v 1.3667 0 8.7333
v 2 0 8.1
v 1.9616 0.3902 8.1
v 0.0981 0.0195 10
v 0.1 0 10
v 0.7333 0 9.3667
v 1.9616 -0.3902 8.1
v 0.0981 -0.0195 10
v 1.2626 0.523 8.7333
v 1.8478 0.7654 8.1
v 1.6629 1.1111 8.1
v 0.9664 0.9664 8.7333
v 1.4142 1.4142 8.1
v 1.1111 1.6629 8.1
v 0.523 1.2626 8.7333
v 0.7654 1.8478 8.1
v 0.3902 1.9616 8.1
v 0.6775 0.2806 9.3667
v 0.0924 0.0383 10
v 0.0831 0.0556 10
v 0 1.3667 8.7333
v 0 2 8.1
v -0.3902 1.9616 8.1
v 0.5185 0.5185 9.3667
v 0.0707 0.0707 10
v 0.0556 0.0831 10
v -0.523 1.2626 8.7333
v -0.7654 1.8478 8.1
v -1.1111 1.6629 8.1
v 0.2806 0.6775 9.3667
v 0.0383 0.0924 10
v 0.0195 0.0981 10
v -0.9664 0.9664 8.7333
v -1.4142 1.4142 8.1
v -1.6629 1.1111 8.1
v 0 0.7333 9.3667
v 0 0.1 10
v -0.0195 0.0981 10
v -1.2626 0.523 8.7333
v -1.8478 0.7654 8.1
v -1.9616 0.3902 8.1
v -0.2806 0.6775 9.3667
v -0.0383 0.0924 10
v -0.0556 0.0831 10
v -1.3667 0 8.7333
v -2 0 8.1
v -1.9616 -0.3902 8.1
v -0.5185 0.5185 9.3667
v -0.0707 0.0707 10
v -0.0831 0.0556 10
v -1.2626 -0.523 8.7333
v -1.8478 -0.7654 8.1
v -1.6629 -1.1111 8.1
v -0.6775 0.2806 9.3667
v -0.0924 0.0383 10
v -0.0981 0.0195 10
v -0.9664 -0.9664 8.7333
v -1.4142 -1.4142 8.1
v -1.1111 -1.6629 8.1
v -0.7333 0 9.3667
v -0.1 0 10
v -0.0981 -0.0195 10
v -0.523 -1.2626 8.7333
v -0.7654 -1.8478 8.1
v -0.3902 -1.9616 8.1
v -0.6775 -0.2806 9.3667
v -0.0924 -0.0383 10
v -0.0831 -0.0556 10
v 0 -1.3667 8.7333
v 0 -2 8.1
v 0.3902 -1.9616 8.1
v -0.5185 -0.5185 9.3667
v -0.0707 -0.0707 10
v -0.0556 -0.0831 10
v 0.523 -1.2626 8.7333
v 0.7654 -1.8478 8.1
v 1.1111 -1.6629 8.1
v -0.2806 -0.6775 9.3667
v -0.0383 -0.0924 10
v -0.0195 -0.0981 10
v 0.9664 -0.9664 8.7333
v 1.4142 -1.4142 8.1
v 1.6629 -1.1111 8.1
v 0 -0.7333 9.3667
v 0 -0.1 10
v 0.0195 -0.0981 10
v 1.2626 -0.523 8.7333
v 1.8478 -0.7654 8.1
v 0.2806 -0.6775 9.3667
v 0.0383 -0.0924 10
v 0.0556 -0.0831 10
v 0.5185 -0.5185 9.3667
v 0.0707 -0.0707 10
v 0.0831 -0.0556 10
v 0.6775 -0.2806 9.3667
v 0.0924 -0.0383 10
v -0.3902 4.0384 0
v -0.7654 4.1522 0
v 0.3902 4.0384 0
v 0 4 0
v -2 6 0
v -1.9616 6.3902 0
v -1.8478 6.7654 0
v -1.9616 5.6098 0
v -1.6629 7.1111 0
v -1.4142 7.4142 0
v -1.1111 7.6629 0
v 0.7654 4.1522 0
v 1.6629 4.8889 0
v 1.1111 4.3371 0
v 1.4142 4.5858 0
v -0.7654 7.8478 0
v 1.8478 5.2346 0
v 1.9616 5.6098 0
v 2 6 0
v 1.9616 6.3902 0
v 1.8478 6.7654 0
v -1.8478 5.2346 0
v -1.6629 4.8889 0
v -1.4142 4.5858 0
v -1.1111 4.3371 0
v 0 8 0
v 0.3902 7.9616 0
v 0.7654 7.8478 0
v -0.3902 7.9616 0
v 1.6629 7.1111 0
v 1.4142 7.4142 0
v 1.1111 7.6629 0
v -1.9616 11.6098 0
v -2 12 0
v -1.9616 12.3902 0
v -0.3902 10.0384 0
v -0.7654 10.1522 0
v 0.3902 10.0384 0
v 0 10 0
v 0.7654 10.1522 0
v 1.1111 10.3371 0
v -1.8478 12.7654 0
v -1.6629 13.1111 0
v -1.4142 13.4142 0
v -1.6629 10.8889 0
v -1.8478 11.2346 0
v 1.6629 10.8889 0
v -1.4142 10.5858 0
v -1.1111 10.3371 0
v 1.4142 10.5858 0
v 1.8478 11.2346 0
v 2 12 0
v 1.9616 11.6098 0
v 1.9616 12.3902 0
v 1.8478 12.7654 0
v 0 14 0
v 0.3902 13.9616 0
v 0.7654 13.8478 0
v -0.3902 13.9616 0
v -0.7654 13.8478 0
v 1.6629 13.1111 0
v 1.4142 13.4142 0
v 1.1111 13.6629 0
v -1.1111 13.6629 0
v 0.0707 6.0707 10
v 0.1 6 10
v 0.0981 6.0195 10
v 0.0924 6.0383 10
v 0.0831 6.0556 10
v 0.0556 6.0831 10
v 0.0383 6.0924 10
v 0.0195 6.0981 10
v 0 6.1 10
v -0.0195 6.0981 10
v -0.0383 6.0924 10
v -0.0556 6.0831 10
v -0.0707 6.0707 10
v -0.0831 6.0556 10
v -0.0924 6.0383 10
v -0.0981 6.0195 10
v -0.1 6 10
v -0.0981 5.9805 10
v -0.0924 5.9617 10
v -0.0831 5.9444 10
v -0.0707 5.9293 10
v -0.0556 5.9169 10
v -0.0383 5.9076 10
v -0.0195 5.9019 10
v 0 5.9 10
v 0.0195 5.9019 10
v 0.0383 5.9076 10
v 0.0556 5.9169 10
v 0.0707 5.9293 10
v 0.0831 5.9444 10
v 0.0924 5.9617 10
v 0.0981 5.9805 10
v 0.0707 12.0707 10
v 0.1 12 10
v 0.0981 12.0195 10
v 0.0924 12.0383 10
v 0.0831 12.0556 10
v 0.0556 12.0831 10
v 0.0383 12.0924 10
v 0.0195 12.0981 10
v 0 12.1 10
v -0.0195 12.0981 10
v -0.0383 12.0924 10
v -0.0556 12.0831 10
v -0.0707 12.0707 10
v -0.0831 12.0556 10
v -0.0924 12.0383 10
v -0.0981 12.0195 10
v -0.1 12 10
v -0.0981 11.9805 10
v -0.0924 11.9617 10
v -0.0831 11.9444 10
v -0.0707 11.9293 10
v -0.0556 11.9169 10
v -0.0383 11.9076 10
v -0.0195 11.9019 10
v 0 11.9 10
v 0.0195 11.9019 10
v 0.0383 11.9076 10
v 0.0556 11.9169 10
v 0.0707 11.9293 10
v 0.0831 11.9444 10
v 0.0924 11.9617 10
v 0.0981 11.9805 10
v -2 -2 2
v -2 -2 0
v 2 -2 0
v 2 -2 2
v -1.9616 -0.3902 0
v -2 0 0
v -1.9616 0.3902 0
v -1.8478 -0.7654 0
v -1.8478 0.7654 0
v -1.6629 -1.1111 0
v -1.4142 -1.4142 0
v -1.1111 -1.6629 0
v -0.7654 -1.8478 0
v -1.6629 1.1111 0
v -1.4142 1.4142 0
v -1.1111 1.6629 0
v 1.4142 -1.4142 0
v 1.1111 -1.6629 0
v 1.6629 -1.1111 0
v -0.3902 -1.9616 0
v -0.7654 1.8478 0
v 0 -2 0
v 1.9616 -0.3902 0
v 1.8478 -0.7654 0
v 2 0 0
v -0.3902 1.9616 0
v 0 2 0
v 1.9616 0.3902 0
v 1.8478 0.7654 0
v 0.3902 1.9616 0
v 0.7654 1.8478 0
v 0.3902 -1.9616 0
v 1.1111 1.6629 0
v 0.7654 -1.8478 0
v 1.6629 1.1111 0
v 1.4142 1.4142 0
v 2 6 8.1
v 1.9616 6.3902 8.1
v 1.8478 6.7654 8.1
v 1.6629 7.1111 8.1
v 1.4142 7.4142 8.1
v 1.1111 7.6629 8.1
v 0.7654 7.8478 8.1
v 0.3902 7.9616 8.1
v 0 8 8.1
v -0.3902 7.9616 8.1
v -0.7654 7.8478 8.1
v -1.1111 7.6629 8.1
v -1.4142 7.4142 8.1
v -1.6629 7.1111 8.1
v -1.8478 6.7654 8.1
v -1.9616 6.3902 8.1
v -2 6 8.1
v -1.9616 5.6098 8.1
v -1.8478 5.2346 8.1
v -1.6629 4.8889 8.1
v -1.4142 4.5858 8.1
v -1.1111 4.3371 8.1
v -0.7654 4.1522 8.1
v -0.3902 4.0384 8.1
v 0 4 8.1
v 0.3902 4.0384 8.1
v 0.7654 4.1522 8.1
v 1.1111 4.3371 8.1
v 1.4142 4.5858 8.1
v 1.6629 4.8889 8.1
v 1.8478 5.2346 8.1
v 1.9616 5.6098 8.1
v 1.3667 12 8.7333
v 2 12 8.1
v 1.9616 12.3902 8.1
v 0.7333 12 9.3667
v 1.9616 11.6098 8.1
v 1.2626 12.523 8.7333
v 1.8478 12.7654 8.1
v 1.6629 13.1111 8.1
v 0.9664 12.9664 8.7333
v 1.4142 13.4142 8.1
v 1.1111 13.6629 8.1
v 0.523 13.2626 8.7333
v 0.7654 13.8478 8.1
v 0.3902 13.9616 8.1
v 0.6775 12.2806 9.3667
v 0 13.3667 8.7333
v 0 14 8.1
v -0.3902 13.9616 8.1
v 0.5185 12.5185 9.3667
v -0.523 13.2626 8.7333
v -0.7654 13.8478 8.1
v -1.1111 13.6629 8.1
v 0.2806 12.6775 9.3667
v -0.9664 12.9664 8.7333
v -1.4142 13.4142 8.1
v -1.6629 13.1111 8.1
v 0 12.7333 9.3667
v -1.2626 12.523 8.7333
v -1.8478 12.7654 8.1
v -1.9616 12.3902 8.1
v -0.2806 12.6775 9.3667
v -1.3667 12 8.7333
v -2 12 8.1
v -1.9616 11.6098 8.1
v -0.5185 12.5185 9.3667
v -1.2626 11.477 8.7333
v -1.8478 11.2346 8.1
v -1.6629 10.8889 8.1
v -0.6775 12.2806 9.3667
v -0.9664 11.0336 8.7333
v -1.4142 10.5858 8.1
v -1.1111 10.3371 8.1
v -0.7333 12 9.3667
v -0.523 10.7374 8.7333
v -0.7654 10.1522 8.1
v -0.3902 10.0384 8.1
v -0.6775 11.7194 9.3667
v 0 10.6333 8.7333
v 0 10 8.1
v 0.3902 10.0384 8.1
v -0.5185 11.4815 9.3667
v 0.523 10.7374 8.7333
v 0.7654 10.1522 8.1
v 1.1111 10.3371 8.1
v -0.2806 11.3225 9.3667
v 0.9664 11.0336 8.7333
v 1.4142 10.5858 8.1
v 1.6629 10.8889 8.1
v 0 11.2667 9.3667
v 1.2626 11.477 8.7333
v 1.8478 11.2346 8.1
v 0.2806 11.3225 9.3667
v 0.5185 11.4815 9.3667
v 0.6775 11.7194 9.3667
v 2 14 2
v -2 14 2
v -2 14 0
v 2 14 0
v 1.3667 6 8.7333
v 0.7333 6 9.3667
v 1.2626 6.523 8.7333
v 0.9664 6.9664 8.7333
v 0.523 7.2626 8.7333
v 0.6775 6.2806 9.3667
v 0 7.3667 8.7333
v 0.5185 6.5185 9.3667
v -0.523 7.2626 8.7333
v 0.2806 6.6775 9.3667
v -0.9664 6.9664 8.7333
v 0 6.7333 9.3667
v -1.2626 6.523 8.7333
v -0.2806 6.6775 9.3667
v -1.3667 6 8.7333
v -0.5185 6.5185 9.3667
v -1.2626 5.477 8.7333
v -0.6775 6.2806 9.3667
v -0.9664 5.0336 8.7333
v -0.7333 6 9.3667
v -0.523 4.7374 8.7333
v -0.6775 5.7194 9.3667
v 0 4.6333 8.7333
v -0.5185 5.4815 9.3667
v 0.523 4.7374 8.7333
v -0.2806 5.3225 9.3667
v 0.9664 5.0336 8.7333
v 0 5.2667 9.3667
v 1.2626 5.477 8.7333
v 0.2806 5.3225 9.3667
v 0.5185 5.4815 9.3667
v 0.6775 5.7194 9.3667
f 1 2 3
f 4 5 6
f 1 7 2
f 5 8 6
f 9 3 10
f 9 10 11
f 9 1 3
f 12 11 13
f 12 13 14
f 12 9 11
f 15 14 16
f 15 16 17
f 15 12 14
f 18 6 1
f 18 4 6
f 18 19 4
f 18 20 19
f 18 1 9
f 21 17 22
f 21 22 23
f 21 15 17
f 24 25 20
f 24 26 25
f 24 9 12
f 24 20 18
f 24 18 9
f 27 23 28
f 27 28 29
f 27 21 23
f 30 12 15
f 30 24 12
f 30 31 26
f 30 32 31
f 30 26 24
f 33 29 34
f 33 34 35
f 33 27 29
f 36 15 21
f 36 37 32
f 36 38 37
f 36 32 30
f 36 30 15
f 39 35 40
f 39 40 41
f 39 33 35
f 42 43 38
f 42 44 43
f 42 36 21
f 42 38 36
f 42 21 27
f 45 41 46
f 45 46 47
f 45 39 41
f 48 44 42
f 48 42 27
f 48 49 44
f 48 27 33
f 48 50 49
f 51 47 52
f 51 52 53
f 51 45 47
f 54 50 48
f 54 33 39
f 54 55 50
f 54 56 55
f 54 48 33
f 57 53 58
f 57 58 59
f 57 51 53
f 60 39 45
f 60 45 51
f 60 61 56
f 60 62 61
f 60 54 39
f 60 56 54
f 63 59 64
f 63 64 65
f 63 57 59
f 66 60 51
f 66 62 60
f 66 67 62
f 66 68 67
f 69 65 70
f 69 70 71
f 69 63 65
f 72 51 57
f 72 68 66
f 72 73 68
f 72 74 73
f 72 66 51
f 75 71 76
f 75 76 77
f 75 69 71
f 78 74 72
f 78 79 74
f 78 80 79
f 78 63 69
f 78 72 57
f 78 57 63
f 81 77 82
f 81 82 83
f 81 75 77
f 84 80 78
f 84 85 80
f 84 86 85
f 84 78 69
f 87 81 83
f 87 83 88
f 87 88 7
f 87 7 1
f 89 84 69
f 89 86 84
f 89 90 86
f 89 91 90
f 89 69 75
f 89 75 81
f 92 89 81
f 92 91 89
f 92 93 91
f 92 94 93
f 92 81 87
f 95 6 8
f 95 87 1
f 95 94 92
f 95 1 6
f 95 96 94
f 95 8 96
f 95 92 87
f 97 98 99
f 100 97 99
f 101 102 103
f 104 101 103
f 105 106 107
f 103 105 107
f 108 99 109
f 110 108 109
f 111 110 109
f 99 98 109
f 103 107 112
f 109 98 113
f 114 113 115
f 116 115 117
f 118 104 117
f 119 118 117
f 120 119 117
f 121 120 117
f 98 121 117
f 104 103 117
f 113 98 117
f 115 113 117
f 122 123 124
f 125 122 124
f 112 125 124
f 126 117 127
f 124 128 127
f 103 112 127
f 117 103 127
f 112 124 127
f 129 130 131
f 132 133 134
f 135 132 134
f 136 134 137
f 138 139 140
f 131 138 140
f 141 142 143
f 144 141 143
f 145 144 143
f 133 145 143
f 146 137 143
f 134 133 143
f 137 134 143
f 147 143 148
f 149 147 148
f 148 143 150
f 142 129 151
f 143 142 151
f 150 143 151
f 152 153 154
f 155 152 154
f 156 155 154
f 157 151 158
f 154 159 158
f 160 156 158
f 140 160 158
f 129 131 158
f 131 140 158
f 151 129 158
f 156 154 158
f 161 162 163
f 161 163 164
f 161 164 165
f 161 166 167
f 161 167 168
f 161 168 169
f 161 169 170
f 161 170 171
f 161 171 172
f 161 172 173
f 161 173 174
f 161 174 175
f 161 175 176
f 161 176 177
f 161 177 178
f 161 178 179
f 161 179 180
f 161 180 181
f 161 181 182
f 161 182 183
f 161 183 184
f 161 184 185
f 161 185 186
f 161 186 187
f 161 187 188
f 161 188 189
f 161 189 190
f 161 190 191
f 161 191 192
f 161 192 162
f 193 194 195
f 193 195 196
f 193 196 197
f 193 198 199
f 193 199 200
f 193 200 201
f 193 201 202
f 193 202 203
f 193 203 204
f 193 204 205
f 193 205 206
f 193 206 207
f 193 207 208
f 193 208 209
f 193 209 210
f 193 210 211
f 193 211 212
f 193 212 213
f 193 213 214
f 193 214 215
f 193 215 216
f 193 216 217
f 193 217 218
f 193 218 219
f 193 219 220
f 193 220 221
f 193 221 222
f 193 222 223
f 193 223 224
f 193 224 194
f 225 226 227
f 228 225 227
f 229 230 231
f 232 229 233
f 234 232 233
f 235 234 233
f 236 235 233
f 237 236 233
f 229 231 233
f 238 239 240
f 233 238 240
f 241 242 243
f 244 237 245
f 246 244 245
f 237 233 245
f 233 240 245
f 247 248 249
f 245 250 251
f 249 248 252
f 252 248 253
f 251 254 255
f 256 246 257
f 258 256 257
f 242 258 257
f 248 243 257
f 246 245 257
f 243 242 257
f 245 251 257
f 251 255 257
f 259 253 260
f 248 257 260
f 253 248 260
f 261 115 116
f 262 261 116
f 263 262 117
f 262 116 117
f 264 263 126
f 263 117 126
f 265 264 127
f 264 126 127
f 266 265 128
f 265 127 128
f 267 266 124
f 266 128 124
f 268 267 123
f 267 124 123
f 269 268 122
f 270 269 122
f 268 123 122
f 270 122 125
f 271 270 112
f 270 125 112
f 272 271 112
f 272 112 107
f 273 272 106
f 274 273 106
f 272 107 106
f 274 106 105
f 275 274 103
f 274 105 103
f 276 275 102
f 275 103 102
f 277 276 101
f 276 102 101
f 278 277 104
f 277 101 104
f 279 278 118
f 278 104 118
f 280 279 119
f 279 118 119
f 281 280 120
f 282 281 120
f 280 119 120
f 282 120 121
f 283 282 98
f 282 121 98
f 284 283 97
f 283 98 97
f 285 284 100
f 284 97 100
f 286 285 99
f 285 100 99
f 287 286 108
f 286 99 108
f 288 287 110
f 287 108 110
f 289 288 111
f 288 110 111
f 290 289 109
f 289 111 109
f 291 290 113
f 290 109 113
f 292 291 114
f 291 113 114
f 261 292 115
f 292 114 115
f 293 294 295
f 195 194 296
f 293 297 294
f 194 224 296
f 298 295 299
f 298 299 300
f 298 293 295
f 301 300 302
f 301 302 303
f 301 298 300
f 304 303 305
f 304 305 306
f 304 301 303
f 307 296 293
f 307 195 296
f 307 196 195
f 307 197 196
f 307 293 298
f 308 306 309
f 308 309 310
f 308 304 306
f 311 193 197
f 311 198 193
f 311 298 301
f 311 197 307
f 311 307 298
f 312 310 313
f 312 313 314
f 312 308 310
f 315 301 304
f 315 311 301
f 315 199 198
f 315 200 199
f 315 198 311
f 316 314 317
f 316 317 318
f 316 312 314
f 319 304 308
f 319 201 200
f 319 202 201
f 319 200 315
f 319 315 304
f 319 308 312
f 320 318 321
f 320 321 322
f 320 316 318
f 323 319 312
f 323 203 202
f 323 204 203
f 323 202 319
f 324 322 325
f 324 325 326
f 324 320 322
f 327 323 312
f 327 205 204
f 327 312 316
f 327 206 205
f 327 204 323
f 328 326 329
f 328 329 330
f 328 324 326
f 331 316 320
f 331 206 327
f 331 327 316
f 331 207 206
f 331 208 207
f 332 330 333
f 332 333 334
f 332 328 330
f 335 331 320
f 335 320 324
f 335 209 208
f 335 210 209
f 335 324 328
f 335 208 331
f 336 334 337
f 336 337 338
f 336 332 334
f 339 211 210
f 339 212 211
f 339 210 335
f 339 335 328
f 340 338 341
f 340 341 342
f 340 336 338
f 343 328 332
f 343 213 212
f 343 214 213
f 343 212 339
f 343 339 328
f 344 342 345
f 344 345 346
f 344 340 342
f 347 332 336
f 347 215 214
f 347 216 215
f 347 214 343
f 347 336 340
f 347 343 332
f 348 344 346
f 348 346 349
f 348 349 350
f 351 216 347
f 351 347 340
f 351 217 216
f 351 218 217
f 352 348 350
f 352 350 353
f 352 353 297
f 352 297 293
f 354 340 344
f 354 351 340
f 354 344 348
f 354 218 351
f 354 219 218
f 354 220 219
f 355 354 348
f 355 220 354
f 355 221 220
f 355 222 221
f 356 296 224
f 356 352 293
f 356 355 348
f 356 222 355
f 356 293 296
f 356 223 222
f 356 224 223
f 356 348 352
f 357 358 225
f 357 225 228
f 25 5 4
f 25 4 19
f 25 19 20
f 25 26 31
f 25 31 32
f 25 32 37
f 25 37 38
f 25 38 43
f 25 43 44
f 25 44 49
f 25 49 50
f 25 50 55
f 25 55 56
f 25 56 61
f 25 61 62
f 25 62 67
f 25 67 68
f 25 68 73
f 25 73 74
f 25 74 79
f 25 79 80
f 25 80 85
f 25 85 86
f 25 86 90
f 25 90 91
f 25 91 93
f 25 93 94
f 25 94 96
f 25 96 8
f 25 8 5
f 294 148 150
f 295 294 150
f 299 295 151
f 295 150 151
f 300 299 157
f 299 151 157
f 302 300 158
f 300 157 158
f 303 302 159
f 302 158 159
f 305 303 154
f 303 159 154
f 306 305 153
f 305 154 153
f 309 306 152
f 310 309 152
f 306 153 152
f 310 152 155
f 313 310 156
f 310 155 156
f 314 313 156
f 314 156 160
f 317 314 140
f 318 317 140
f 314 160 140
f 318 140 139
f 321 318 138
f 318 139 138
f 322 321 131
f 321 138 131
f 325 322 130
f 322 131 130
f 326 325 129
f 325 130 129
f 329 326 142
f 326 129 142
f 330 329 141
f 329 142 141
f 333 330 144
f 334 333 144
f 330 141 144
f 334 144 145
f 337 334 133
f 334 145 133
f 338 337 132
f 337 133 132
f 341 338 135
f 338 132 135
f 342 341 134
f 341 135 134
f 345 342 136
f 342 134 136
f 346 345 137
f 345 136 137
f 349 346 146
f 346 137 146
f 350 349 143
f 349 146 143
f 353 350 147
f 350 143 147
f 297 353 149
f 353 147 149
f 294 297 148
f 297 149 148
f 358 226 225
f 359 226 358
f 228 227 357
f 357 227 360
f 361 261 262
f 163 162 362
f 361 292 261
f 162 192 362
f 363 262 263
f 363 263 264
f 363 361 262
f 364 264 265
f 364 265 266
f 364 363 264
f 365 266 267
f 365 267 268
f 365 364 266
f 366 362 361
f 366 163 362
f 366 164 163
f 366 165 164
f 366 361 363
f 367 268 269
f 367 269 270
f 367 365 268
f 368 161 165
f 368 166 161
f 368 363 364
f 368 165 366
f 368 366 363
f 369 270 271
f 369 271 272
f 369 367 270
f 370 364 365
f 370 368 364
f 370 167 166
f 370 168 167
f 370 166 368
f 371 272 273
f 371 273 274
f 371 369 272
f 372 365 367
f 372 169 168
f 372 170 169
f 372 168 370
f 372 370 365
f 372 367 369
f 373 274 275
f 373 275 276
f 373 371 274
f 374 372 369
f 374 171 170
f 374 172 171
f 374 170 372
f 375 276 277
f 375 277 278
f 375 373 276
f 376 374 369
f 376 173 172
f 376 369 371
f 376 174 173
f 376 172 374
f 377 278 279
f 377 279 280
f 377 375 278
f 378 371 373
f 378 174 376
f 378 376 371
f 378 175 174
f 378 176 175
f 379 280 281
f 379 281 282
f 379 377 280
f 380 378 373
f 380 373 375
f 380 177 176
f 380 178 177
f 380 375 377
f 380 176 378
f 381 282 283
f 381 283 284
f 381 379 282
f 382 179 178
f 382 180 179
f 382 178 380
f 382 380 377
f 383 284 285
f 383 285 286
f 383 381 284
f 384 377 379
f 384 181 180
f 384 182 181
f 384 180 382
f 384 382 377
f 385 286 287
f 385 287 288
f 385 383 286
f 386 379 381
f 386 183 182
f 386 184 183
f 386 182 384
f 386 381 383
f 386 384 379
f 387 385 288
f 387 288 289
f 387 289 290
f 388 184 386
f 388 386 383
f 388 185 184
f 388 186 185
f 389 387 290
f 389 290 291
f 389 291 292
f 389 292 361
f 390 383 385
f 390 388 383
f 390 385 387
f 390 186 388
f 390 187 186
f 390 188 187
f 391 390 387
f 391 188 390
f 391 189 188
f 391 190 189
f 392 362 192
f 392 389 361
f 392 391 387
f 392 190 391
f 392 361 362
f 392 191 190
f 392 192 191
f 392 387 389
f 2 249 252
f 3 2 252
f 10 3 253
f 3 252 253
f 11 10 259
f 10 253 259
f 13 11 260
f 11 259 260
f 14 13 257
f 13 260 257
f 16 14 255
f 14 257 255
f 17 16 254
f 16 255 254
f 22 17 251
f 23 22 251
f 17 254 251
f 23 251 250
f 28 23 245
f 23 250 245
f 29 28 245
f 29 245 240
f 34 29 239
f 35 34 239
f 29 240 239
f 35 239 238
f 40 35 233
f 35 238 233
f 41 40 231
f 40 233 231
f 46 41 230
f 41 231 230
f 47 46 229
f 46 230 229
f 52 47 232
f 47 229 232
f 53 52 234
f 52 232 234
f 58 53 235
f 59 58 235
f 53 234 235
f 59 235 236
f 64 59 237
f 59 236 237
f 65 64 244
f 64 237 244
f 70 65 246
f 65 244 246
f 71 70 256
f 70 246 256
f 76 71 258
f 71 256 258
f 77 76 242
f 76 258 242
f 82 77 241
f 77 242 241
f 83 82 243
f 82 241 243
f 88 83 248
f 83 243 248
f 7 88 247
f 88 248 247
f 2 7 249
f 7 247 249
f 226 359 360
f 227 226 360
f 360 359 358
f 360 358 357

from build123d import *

# Parameters (mm, degrees)
CYLINDER_R        = 2
CYLINDER_DEPTH    = 10
CHAMFER_SIZE      = 1.9
CYLINDER001_R     = 2
CYLINDER001_DEPTH = 10
CHAMFER001_SIZE   = 1.9
CYLINDER002_R     = 2
CYLINDER002_DEPTH = 10
CHAMFER002_SIZE   = 1.9
BOX_W             = 4
BOX_H             = 16
BOX_DEPTH         = 2


with BuildPart() as chamfer_body:
    # Cylinder → Cylinder (new body)
    with BuildSketch(Plane.XY):
        Circle(CYLINDER_R)
    extrude(amount=CYLINDER_DEPTH)

    # Chamfer
    chamfer_edges = [chamfer_body.edges().sort_by_distance(p)[0] for p in [
        (-2, 0, 10),
    ]]
    chamfer(chamfer_edges, length=CHAMFER_SIZE)


with BuildPart() as chamfer001:
    # Cylinder001 → Cylinder001 (new body)
    with BuildSketch(Plane.XY):
        Circle(CYLINDER001_R)
    extrude(amount=CYLINDER001_DEPTH)

    # Chamfer001
    chamfer001_edges = [chamfer001.edges().sort_by_distance(p)[0] for p in [
        (-2, 0, 10),
    ]]
    chamfer(chamfer001_edges, length=CHAMFER001_SIZE)


with BuildPart() as chamfer001_1:
    # Chamfer001 placement: moved
    add(chamfer001.part.moved(Location((0, 6, 0))))


with BuildPart() as chamfer002:
    # Cylinder002 → Cylinder002 (new body)
    with BuildSketch(Plane.XY):
        Circle(CYLINDER002_R)
    extrude(amount=CYLINDER002_DEPTH)

    # Chamfer002
    chamfer002_edges = [chamfer002.edges().sort_by_distance(p)[0] for p in [
        (-2, 0, 10),
    ]]
    chamfer(chamfer002_edges, length=CHAMFER002_SIZE)


with BuildPart() as chamfer002_1:
    # Chamfer002 placement: moved
    add(chamfer002.part.moved(Location((0, 12, 0))))


with BuildPart() as cubo:
    # Box → Box (new body)
    with BuildSketch(Plane(origin=(-2, -2, 0), x_dir=(1, 0, 0), z_dir=(0, 0, 1))):
        with Locations((2, 8)):
            Rectangle(BOX_W, BOX_H)
    extrude(amount=BOX_DEPTH)


solid = Compound([chamfer_body.part, chamfer001_1.part, chamfer002_1.part, cubo.part])
